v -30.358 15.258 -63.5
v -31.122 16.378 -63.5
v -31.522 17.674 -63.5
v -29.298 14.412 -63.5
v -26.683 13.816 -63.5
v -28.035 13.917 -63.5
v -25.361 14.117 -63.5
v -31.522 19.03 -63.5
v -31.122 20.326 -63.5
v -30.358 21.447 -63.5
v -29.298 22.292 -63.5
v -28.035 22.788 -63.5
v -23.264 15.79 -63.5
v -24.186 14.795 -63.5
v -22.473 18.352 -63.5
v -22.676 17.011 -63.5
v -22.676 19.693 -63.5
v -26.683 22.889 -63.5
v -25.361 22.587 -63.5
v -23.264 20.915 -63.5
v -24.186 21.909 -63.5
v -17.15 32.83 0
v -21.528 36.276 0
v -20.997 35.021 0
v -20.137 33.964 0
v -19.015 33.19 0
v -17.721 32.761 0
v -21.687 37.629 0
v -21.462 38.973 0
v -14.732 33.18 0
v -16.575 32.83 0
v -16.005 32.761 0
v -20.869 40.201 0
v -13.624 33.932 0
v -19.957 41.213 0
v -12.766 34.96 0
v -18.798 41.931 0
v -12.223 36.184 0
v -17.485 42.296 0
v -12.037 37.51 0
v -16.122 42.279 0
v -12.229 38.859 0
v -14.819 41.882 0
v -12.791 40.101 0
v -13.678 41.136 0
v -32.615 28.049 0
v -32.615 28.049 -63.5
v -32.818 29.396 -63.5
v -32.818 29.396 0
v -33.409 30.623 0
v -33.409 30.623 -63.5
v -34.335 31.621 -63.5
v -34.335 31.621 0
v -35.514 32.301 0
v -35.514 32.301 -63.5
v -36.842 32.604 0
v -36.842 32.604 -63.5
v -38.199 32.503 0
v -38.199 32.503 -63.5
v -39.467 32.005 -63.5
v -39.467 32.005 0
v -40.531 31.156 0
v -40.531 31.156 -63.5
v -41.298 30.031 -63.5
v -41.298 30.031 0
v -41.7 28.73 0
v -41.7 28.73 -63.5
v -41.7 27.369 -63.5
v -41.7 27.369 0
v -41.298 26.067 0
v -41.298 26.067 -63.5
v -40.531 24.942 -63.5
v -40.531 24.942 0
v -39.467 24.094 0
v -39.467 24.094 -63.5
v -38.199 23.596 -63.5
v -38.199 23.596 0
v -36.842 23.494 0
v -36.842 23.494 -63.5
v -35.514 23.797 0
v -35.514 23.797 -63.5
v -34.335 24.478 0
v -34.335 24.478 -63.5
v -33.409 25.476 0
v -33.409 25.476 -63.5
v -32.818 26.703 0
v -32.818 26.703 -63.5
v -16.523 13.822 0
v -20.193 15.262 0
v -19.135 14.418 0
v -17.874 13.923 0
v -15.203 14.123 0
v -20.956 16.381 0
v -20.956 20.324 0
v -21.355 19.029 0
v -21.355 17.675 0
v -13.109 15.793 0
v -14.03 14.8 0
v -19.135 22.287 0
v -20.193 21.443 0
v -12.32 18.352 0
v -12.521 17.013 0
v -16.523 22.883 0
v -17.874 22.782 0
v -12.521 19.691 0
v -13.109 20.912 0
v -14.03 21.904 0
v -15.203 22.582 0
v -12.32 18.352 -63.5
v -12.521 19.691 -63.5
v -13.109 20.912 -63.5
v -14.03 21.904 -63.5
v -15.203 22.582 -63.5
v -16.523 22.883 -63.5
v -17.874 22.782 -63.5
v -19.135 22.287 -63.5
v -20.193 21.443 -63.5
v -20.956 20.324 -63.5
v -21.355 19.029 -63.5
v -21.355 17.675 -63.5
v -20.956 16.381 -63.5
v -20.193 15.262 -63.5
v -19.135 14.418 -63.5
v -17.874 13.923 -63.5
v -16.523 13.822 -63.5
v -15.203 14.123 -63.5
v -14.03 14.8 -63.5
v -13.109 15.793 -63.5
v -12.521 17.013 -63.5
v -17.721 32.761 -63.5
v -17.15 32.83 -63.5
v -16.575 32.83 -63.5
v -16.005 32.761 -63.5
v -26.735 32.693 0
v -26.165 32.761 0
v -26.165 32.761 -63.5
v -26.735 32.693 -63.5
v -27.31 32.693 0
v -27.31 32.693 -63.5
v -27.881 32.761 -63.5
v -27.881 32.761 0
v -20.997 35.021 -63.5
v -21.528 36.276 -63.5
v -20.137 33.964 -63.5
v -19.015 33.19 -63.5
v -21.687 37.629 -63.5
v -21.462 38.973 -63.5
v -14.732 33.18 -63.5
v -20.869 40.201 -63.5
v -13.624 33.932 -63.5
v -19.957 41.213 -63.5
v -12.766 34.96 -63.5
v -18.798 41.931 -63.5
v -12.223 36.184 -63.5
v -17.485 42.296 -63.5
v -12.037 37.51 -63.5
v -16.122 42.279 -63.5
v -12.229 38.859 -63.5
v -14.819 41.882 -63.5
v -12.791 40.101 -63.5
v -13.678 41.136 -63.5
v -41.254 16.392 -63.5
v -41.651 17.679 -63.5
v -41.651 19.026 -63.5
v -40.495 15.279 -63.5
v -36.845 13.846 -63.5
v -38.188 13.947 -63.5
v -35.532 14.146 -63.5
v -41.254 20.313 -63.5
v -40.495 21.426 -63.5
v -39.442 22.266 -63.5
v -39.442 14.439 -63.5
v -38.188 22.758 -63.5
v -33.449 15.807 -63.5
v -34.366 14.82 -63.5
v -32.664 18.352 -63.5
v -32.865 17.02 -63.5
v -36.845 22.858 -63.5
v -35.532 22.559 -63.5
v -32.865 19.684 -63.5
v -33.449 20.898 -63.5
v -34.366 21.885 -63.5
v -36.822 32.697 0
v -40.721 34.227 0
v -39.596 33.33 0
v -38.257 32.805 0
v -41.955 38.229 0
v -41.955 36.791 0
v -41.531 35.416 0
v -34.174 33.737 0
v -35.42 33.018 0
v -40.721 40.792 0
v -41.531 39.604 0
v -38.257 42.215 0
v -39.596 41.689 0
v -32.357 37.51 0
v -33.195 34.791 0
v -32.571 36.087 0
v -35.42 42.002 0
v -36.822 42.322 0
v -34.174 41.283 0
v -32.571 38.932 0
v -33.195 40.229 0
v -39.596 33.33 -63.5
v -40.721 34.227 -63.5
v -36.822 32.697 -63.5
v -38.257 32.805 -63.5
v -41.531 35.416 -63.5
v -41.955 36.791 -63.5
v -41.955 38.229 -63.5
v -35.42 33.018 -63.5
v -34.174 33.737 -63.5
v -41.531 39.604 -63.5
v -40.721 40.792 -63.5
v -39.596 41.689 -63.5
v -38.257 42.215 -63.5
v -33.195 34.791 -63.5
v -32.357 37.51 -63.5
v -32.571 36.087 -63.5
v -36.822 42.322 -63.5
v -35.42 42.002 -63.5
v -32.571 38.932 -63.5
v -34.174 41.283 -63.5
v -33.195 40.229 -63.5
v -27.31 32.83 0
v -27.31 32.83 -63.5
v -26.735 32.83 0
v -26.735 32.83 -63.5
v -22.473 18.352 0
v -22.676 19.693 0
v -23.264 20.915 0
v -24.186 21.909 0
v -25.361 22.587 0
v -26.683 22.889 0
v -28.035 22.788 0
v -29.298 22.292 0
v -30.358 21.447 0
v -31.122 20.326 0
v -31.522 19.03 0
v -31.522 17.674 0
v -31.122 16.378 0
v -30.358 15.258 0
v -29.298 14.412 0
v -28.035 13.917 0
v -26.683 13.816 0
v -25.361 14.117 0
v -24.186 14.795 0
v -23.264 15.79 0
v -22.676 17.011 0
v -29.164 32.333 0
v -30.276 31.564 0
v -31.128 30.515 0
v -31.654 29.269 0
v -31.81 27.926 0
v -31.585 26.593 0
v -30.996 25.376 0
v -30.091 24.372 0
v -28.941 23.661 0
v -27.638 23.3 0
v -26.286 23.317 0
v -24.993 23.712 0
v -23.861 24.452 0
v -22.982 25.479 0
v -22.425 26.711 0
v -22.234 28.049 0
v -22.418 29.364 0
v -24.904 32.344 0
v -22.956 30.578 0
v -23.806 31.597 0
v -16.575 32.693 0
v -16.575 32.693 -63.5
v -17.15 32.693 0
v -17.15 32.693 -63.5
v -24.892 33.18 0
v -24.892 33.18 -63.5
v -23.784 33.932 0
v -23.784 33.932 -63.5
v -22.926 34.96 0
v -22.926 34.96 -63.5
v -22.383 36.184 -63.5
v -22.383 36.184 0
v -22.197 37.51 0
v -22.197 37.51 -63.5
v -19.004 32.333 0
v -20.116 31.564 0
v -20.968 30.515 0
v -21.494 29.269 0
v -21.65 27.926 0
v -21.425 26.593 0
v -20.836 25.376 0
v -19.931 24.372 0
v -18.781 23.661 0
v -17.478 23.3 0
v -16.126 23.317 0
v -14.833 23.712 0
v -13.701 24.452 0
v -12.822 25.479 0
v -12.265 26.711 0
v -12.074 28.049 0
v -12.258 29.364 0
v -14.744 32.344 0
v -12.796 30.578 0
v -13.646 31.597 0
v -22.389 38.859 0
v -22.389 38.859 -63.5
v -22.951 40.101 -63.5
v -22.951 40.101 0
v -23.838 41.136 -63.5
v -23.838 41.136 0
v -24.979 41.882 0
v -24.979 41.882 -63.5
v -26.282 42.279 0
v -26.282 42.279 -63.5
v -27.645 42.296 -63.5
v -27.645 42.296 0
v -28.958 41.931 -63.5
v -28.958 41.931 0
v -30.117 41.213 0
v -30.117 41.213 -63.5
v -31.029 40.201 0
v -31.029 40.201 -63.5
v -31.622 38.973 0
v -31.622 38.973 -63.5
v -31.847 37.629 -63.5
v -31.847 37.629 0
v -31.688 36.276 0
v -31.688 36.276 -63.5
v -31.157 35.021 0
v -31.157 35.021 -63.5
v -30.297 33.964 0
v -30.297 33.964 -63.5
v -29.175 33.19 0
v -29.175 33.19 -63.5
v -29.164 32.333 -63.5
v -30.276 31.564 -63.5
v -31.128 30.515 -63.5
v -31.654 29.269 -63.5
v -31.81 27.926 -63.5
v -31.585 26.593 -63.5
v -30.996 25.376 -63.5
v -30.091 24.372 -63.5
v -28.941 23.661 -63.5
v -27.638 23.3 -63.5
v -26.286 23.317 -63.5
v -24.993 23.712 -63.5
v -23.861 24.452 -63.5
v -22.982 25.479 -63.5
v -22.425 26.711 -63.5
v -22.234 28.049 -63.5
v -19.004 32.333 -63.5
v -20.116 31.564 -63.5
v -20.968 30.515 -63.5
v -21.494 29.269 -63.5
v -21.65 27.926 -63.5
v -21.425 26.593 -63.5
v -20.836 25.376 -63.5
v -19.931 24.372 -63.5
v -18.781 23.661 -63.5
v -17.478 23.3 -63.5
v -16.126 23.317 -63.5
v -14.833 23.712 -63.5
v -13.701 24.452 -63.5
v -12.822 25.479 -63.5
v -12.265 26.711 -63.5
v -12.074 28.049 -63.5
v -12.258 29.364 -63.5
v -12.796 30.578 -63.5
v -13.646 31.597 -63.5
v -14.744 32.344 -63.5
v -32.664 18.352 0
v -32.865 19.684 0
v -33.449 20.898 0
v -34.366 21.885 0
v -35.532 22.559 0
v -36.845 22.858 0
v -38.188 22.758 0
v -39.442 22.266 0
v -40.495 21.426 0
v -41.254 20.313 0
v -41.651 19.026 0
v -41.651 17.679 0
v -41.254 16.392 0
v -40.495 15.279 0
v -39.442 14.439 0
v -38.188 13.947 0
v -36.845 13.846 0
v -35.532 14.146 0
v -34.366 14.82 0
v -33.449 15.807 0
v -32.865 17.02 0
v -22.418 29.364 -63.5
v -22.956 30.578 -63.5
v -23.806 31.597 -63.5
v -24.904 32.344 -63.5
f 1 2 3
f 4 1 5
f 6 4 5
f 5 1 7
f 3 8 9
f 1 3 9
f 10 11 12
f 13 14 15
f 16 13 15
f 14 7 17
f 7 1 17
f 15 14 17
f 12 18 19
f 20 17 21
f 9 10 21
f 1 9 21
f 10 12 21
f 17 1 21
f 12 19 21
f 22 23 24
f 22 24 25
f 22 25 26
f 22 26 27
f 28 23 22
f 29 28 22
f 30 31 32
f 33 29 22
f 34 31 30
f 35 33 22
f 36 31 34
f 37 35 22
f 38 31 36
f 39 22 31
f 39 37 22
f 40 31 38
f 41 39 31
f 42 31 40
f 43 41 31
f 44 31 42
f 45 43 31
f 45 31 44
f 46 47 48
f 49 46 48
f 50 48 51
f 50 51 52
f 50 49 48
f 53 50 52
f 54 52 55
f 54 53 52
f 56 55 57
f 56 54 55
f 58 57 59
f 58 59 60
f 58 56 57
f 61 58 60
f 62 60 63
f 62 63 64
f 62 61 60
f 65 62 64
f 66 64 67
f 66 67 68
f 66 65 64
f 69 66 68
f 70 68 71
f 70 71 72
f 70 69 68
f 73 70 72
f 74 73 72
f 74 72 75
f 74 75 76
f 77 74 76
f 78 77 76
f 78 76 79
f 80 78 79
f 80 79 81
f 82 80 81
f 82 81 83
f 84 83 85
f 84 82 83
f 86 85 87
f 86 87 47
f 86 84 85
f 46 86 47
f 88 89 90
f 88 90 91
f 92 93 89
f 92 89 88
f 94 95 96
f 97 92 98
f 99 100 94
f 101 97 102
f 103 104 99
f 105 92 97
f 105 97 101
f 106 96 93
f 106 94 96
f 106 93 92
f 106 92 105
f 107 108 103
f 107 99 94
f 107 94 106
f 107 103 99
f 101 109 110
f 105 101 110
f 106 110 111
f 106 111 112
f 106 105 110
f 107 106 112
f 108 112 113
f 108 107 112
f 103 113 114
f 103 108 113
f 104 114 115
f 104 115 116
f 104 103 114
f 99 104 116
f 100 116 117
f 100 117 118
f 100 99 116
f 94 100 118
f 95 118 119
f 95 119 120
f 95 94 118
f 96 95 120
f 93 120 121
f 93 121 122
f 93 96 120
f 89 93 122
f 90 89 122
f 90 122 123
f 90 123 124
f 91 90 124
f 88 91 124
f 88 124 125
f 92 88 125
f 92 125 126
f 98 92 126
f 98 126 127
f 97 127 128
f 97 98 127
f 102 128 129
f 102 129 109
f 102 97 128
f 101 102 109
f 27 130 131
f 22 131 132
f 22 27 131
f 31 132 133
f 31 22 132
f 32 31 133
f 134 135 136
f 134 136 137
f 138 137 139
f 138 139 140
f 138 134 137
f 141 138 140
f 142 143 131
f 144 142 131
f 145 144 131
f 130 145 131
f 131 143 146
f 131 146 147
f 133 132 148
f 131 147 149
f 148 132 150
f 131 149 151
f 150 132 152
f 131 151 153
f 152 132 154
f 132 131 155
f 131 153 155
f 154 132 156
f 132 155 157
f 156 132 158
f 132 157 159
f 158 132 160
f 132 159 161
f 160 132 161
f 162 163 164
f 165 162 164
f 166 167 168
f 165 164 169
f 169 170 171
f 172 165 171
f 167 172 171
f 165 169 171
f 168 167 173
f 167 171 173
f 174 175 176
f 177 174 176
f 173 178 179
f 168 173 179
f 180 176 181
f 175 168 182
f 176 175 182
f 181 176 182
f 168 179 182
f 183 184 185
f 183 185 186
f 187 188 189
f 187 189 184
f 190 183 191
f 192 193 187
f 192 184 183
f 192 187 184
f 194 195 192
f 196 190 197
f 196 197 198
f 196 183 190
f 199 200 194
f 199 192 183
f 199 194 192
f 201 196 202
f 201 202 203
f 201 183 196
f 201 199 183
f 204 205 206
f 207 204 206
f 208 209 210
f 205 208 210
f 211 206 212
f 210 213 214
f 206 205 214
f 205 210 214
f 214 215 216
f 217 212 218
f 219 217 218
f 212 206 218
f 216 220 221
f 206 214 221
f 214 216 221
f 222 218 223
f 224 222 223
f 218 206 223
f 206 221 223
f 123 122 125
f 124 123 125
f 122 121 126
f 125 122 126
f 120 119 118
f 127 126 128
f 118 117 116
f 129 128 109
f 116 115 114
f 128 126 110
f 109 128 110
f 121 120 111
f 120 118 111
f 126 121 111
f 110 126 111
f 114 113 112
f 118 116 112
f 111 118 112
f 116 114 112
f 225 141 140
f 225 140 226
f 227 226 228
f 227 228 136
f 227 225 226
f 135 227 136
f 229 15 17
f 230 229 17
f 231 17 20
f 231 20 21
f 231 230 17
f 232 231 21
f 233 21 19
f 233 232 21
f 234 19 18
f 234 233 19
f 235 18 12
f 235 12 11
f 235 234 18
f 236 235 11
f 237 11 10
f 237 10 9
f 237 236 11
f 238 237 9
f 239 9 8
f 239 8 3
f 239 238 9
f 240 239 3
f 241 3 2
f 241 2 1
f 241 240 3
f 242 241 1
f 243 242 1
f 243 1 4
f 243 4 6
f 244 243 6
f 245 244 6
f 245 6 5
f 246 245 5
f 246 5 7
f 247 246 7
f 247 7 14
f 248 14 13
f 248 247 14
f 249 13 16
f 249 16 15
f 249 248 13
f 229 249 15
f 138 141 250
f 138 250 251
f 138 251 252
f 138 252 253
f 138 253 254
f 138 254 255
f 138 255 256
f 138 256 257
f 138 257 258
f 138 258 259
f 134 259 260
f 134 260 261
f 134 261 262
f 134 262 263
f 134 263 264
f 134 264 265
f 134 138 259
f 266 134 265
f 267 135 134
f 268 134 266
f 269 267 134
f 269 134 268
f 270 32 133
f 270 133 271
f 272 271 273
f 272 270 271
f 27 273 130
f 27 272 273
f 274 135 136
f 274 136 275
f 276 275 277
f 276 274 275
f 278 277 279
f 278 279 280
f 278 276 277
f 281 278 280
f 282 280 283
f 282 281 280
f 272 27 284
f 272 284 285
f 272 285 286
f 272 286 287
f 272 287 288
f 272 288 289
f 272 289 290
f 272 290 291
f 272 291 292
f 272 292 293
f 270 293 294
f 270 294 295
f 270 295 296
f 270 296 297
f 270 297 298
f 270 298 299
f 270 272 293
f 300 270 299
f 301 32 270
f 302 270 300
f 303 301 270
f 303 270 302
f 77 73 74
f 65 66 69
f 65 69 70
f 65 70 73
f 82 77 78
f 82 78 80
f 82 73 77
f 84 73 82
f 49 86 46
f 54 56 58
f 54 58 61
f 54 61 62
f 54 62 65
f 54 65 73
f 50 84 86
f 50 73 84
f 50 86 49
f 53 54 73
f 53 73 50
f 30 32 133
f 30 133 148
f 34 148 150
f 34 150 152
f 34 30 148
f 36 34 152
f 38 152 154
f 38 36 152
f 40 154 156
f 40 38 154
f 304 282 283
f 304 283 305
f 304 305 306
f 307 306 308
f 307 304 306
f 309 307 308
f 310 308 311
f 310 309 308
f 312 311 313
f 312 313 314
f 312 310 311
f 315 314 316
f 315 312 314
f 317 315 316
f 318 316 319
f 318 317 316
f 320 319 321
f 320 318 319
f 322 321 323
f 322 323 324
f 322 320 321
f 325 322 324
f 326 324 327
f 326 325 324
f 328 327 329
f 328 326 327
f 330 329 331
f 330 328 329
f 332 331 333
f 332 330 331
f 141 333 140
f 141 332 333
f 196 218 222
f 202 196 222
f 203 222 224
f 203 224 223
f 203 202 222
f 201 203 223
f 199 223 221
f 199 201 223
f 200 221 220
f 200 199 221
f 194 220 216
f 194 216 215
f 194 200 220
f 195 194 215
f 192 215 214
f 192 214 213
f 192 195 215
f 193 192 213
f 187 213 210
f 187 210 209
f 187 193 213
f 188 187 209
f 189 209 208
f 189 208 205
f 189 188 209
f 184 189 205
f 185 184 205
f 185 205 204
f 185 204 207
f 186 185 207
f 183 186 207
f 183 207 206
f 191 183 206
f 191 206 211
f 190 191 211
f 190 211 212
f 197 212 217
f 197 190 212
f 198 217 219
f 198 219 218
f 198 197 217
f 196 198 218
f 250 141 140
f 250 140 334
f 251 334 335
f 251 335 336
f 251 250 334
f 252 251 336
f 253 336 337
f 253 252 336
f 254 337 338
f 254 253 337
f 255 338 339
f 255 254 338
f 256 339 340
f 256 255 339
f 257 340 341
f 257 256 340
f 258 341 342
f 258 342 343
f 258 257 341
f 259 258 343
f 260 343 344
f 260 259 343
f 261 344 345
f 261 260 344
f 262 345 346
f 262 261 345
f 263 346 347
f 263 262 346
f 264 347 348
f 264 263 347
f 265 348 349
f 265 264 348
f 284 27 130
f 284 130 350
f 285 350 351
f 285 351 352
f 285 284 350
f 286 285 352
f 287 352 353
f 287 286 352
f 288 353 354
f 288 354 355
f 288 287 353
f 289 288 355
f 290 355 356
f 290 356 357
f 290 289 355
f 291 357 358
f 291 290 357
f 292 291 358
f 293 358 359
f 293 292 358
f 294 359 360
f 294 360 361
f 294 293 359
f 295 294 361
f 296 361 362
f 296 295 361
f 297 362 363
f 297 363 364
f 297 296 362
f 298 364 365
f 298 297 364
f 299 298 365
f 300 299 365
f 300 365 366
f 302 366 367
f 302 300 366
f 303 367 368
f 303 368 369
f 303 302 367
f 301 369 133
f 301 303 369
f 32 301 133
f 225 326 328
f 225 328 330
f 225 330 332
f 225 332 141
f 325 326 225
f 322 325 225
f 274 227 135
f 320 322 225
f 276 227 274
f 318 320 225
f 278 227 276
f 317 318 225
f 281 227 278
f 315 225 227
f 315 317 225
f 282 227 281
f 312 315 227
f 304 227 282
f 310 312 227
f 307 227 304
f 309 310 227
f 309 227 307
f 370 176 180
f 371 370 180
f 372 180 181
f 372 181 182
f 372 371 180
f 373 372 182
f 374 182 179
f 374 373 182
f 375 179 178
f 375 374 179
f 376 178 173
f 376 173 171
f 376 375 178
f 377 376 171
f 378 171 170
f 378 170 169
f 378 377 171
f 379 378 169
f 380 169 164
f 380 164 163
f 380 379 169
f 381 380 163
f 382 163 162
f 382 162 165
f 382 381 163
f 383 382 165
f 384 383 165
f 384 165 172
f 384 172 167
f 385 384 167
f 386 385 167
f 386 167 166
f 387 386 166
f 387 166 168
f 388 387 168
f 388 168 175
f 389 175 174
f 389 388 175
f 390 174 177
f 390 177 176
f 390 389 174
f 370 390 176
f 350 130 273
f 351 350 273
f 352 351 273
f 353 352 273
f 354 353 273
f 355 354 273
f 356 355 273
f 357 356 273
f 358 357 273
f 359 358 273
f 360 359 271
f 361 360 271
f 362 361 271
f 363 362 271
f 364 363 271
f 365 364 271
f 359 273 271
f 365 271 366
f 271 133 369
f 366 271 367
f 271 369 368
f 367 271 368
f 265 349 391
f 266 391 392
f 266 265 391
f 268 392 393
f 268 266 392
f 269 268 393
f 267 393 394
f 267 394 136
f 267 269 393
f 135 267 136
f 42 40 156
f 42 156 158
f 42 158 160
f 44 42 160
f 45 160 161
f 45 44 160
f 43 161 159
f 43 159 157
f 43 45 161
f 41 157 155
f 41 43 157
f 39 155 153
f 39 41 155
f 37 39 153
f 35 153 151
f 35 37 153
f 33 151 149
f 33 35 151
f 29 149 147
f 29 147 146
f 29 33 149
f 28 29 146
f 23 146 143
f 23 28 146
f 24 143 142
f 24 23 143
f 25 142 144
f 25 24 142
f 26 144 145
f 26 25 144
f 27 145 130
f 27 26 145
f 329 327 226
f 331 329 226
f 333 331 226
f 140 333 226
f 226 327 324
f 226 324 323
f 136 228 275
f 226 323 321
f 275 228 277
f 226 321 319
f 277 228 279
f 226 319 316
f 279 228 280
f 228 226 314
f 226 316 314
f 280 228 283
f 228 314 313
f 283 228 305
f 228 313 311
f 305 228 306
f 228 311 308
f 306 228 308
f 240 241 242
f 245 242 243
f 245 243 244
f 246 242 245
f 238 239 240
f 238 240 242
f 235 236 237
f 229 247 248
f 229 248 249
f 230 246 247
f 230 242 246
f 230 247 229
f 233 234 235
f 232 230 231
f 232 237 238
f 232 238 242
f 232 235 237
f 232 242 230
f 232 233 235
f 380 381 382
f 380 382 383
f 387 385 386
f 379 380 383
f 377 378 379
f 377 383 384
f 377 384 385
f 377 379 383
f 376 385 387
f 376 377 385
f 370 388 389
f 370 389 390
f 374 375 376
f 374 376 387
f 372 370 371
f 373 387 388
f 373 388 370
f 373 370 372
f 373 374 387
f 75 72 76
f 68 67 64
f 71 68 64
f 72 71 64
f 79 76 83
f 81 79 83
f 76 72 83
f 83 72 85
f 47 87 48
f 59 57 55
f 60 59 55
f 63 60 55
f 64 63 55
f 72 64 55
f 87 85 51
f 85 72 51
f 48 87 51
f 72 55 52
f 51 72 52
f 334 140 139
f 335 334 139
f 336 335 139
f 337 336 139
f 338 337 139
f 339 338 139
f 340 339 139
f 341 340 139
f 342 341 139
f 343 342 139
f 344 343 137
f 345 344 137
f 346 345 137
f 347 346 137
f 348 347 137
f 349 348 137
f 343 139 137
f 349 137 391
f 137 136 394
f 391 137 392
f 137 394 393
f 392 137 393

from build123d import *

# Parameters (mm, degrees)
F0_R     = 4.5185908262
F1_DEPTH = 63.5
F0_R_2   = 4.549435191
F0_R_3   = 4.5432827018
F0_R_4   = 4.5678424554
F0_R_5   = 4.826


with BuildPart() as f1:
    # F0 (on Top) → F1 (new body)
    with BuildSketch(Plane.XY):
        with Locations((-37.1828824282, 18.3523092419)):
            Circle(F0_R)
    extrude(amount=-F1_DEPTH)


with BuildPart() as f1b:
    # F0 (on Top) → F1, piece 2 (new body)
    with BuildSketch(Plane.XY):
        with Locations((-27.0228824282, 18.3523092419)):
            Circle(F0_R_2)
    extrude(amount=-F1_DEPTH)


with BuildPart() as f1c:
    # F0 (on Top) → F1, piece 3 (new body)
    with BuildSketch(Plane.XY):
        with Locations((-16.8628824282, 18.3523092419)):
            Circle(F0_R_3)
    extrude(amount=-F1_DEPTH)


with BuildPart() as f1d:
    # F0 (on Top) → F1, piece 4 (new body)
    with BuildSketch(Plane.XY):
        with BuildLine():
            ThreePointArc((-16.0045600975, 32.7608743887), (-16.8628824282, 32.6839331141), (-17.7212047588, 32.7608743887))
            ThreePointArc((-17.7212047588, 32.7608743887), (-19.9308101359, 24.3720544631), (-12.0738428075, 28.0493795872))
            ThreePointArc((-12.0738428075, 28.0493795872), (-13.1855573041, 31.1173072949), (-16.0045600975, 32.7608743887))
        make_face()
    extrude(amount=-F1_DEPTH)


with BuildPart() as f1e:
    # F0 (on Top) → F1, piece 5 (new body)
    with BuildSketch(Plane.XY):
        with BuildLine():
            ThreePointArc((-26.1645558464, 32.7608751571), (-27.0228824282, 32.6839331141), (-27.88120901, 32.7608751571))
            ThreePointArc((-27.88120901, 32.7608751571), (-30.0908095554, 24.3720520021), (-22.2338412897, 28.0493795872))
            ThreePointArc((-22.2338412897, 28.0493795872), (-23.345554843, 31.1173067144), (-26.1645558464, 32.7608751571))
        make_face()
    extrude(amount=-F1_DEPTH)


with BuildPart() as f1f:
    # F0 (on Top) → F1, piece 6 (new body)
    with BuildSketch(Plane.XY):
        with Locations((-37.1828824282, 28.0493795872)):
            Circle(F0_R_4)
    extrude(amount=-F1_DEPTH)


with BuildPart() as f1g:
    # F0 (on Top) → F1, piece 7 (new body)
    with BuildSketch(Plane.XY):
        with Locations((-37.1828824282, 37.5099331141)):
            Circle(F0_R_5)
    extrude(amount=-F1_DEPTH)


with BuildPart() as f1h:
    # F0 (on Top) → F1, piece 8 (new body)
    with BuildSketch(Plane.XY):
        with BuildLine():
            ThreePointArc((-26.1645558464, 32.7608751571), (-23.3193327739, 34.4157456669), (-22.1968824282, 37.5099331141))
            ThreePointArc((-22.1968824282, 37.5099331141), (-30.1170698753, 41.2134827684), (-27.88120901, 32.7608751571))
            ThreePointArc((-27.88120901, 32.7608751571), (-27.0228824282, 32.8384207257), (-26.1645558464, 32.7608751571))
        make_face()
    extrude(amount=-F1_DEPTH)


with BuildPart() as f1i:
    # F0 (on Top) → F1, piece 9 (new body)
    with BuildSketch(Plane.XY):
        with BuildLine():
            ThreePointArc((-16.0045600975, 32.7608743887), (-13.1593341588, 34.4157440093), (-12.0368824282, 37.5099331141))
            ThreePointArc((-12.0368824282, 37.5099331141), (-19.957071533, 41.2134813835), (-17.7212047588, 32.7608743887))
            ThreePointArc((-17.7212047588, 32.7608743887), (-16.8628824282, 32.8384192078), (-16.0045600975, 32.7608743887))
        make_face()
    extrude(amount=-F1_DEPTH)


solid = Compound([f1.part, f1b.part, f1c.part, f1d.part, f1e.part, f1f.part, f1g.part, f1h.part, f1i.part])
